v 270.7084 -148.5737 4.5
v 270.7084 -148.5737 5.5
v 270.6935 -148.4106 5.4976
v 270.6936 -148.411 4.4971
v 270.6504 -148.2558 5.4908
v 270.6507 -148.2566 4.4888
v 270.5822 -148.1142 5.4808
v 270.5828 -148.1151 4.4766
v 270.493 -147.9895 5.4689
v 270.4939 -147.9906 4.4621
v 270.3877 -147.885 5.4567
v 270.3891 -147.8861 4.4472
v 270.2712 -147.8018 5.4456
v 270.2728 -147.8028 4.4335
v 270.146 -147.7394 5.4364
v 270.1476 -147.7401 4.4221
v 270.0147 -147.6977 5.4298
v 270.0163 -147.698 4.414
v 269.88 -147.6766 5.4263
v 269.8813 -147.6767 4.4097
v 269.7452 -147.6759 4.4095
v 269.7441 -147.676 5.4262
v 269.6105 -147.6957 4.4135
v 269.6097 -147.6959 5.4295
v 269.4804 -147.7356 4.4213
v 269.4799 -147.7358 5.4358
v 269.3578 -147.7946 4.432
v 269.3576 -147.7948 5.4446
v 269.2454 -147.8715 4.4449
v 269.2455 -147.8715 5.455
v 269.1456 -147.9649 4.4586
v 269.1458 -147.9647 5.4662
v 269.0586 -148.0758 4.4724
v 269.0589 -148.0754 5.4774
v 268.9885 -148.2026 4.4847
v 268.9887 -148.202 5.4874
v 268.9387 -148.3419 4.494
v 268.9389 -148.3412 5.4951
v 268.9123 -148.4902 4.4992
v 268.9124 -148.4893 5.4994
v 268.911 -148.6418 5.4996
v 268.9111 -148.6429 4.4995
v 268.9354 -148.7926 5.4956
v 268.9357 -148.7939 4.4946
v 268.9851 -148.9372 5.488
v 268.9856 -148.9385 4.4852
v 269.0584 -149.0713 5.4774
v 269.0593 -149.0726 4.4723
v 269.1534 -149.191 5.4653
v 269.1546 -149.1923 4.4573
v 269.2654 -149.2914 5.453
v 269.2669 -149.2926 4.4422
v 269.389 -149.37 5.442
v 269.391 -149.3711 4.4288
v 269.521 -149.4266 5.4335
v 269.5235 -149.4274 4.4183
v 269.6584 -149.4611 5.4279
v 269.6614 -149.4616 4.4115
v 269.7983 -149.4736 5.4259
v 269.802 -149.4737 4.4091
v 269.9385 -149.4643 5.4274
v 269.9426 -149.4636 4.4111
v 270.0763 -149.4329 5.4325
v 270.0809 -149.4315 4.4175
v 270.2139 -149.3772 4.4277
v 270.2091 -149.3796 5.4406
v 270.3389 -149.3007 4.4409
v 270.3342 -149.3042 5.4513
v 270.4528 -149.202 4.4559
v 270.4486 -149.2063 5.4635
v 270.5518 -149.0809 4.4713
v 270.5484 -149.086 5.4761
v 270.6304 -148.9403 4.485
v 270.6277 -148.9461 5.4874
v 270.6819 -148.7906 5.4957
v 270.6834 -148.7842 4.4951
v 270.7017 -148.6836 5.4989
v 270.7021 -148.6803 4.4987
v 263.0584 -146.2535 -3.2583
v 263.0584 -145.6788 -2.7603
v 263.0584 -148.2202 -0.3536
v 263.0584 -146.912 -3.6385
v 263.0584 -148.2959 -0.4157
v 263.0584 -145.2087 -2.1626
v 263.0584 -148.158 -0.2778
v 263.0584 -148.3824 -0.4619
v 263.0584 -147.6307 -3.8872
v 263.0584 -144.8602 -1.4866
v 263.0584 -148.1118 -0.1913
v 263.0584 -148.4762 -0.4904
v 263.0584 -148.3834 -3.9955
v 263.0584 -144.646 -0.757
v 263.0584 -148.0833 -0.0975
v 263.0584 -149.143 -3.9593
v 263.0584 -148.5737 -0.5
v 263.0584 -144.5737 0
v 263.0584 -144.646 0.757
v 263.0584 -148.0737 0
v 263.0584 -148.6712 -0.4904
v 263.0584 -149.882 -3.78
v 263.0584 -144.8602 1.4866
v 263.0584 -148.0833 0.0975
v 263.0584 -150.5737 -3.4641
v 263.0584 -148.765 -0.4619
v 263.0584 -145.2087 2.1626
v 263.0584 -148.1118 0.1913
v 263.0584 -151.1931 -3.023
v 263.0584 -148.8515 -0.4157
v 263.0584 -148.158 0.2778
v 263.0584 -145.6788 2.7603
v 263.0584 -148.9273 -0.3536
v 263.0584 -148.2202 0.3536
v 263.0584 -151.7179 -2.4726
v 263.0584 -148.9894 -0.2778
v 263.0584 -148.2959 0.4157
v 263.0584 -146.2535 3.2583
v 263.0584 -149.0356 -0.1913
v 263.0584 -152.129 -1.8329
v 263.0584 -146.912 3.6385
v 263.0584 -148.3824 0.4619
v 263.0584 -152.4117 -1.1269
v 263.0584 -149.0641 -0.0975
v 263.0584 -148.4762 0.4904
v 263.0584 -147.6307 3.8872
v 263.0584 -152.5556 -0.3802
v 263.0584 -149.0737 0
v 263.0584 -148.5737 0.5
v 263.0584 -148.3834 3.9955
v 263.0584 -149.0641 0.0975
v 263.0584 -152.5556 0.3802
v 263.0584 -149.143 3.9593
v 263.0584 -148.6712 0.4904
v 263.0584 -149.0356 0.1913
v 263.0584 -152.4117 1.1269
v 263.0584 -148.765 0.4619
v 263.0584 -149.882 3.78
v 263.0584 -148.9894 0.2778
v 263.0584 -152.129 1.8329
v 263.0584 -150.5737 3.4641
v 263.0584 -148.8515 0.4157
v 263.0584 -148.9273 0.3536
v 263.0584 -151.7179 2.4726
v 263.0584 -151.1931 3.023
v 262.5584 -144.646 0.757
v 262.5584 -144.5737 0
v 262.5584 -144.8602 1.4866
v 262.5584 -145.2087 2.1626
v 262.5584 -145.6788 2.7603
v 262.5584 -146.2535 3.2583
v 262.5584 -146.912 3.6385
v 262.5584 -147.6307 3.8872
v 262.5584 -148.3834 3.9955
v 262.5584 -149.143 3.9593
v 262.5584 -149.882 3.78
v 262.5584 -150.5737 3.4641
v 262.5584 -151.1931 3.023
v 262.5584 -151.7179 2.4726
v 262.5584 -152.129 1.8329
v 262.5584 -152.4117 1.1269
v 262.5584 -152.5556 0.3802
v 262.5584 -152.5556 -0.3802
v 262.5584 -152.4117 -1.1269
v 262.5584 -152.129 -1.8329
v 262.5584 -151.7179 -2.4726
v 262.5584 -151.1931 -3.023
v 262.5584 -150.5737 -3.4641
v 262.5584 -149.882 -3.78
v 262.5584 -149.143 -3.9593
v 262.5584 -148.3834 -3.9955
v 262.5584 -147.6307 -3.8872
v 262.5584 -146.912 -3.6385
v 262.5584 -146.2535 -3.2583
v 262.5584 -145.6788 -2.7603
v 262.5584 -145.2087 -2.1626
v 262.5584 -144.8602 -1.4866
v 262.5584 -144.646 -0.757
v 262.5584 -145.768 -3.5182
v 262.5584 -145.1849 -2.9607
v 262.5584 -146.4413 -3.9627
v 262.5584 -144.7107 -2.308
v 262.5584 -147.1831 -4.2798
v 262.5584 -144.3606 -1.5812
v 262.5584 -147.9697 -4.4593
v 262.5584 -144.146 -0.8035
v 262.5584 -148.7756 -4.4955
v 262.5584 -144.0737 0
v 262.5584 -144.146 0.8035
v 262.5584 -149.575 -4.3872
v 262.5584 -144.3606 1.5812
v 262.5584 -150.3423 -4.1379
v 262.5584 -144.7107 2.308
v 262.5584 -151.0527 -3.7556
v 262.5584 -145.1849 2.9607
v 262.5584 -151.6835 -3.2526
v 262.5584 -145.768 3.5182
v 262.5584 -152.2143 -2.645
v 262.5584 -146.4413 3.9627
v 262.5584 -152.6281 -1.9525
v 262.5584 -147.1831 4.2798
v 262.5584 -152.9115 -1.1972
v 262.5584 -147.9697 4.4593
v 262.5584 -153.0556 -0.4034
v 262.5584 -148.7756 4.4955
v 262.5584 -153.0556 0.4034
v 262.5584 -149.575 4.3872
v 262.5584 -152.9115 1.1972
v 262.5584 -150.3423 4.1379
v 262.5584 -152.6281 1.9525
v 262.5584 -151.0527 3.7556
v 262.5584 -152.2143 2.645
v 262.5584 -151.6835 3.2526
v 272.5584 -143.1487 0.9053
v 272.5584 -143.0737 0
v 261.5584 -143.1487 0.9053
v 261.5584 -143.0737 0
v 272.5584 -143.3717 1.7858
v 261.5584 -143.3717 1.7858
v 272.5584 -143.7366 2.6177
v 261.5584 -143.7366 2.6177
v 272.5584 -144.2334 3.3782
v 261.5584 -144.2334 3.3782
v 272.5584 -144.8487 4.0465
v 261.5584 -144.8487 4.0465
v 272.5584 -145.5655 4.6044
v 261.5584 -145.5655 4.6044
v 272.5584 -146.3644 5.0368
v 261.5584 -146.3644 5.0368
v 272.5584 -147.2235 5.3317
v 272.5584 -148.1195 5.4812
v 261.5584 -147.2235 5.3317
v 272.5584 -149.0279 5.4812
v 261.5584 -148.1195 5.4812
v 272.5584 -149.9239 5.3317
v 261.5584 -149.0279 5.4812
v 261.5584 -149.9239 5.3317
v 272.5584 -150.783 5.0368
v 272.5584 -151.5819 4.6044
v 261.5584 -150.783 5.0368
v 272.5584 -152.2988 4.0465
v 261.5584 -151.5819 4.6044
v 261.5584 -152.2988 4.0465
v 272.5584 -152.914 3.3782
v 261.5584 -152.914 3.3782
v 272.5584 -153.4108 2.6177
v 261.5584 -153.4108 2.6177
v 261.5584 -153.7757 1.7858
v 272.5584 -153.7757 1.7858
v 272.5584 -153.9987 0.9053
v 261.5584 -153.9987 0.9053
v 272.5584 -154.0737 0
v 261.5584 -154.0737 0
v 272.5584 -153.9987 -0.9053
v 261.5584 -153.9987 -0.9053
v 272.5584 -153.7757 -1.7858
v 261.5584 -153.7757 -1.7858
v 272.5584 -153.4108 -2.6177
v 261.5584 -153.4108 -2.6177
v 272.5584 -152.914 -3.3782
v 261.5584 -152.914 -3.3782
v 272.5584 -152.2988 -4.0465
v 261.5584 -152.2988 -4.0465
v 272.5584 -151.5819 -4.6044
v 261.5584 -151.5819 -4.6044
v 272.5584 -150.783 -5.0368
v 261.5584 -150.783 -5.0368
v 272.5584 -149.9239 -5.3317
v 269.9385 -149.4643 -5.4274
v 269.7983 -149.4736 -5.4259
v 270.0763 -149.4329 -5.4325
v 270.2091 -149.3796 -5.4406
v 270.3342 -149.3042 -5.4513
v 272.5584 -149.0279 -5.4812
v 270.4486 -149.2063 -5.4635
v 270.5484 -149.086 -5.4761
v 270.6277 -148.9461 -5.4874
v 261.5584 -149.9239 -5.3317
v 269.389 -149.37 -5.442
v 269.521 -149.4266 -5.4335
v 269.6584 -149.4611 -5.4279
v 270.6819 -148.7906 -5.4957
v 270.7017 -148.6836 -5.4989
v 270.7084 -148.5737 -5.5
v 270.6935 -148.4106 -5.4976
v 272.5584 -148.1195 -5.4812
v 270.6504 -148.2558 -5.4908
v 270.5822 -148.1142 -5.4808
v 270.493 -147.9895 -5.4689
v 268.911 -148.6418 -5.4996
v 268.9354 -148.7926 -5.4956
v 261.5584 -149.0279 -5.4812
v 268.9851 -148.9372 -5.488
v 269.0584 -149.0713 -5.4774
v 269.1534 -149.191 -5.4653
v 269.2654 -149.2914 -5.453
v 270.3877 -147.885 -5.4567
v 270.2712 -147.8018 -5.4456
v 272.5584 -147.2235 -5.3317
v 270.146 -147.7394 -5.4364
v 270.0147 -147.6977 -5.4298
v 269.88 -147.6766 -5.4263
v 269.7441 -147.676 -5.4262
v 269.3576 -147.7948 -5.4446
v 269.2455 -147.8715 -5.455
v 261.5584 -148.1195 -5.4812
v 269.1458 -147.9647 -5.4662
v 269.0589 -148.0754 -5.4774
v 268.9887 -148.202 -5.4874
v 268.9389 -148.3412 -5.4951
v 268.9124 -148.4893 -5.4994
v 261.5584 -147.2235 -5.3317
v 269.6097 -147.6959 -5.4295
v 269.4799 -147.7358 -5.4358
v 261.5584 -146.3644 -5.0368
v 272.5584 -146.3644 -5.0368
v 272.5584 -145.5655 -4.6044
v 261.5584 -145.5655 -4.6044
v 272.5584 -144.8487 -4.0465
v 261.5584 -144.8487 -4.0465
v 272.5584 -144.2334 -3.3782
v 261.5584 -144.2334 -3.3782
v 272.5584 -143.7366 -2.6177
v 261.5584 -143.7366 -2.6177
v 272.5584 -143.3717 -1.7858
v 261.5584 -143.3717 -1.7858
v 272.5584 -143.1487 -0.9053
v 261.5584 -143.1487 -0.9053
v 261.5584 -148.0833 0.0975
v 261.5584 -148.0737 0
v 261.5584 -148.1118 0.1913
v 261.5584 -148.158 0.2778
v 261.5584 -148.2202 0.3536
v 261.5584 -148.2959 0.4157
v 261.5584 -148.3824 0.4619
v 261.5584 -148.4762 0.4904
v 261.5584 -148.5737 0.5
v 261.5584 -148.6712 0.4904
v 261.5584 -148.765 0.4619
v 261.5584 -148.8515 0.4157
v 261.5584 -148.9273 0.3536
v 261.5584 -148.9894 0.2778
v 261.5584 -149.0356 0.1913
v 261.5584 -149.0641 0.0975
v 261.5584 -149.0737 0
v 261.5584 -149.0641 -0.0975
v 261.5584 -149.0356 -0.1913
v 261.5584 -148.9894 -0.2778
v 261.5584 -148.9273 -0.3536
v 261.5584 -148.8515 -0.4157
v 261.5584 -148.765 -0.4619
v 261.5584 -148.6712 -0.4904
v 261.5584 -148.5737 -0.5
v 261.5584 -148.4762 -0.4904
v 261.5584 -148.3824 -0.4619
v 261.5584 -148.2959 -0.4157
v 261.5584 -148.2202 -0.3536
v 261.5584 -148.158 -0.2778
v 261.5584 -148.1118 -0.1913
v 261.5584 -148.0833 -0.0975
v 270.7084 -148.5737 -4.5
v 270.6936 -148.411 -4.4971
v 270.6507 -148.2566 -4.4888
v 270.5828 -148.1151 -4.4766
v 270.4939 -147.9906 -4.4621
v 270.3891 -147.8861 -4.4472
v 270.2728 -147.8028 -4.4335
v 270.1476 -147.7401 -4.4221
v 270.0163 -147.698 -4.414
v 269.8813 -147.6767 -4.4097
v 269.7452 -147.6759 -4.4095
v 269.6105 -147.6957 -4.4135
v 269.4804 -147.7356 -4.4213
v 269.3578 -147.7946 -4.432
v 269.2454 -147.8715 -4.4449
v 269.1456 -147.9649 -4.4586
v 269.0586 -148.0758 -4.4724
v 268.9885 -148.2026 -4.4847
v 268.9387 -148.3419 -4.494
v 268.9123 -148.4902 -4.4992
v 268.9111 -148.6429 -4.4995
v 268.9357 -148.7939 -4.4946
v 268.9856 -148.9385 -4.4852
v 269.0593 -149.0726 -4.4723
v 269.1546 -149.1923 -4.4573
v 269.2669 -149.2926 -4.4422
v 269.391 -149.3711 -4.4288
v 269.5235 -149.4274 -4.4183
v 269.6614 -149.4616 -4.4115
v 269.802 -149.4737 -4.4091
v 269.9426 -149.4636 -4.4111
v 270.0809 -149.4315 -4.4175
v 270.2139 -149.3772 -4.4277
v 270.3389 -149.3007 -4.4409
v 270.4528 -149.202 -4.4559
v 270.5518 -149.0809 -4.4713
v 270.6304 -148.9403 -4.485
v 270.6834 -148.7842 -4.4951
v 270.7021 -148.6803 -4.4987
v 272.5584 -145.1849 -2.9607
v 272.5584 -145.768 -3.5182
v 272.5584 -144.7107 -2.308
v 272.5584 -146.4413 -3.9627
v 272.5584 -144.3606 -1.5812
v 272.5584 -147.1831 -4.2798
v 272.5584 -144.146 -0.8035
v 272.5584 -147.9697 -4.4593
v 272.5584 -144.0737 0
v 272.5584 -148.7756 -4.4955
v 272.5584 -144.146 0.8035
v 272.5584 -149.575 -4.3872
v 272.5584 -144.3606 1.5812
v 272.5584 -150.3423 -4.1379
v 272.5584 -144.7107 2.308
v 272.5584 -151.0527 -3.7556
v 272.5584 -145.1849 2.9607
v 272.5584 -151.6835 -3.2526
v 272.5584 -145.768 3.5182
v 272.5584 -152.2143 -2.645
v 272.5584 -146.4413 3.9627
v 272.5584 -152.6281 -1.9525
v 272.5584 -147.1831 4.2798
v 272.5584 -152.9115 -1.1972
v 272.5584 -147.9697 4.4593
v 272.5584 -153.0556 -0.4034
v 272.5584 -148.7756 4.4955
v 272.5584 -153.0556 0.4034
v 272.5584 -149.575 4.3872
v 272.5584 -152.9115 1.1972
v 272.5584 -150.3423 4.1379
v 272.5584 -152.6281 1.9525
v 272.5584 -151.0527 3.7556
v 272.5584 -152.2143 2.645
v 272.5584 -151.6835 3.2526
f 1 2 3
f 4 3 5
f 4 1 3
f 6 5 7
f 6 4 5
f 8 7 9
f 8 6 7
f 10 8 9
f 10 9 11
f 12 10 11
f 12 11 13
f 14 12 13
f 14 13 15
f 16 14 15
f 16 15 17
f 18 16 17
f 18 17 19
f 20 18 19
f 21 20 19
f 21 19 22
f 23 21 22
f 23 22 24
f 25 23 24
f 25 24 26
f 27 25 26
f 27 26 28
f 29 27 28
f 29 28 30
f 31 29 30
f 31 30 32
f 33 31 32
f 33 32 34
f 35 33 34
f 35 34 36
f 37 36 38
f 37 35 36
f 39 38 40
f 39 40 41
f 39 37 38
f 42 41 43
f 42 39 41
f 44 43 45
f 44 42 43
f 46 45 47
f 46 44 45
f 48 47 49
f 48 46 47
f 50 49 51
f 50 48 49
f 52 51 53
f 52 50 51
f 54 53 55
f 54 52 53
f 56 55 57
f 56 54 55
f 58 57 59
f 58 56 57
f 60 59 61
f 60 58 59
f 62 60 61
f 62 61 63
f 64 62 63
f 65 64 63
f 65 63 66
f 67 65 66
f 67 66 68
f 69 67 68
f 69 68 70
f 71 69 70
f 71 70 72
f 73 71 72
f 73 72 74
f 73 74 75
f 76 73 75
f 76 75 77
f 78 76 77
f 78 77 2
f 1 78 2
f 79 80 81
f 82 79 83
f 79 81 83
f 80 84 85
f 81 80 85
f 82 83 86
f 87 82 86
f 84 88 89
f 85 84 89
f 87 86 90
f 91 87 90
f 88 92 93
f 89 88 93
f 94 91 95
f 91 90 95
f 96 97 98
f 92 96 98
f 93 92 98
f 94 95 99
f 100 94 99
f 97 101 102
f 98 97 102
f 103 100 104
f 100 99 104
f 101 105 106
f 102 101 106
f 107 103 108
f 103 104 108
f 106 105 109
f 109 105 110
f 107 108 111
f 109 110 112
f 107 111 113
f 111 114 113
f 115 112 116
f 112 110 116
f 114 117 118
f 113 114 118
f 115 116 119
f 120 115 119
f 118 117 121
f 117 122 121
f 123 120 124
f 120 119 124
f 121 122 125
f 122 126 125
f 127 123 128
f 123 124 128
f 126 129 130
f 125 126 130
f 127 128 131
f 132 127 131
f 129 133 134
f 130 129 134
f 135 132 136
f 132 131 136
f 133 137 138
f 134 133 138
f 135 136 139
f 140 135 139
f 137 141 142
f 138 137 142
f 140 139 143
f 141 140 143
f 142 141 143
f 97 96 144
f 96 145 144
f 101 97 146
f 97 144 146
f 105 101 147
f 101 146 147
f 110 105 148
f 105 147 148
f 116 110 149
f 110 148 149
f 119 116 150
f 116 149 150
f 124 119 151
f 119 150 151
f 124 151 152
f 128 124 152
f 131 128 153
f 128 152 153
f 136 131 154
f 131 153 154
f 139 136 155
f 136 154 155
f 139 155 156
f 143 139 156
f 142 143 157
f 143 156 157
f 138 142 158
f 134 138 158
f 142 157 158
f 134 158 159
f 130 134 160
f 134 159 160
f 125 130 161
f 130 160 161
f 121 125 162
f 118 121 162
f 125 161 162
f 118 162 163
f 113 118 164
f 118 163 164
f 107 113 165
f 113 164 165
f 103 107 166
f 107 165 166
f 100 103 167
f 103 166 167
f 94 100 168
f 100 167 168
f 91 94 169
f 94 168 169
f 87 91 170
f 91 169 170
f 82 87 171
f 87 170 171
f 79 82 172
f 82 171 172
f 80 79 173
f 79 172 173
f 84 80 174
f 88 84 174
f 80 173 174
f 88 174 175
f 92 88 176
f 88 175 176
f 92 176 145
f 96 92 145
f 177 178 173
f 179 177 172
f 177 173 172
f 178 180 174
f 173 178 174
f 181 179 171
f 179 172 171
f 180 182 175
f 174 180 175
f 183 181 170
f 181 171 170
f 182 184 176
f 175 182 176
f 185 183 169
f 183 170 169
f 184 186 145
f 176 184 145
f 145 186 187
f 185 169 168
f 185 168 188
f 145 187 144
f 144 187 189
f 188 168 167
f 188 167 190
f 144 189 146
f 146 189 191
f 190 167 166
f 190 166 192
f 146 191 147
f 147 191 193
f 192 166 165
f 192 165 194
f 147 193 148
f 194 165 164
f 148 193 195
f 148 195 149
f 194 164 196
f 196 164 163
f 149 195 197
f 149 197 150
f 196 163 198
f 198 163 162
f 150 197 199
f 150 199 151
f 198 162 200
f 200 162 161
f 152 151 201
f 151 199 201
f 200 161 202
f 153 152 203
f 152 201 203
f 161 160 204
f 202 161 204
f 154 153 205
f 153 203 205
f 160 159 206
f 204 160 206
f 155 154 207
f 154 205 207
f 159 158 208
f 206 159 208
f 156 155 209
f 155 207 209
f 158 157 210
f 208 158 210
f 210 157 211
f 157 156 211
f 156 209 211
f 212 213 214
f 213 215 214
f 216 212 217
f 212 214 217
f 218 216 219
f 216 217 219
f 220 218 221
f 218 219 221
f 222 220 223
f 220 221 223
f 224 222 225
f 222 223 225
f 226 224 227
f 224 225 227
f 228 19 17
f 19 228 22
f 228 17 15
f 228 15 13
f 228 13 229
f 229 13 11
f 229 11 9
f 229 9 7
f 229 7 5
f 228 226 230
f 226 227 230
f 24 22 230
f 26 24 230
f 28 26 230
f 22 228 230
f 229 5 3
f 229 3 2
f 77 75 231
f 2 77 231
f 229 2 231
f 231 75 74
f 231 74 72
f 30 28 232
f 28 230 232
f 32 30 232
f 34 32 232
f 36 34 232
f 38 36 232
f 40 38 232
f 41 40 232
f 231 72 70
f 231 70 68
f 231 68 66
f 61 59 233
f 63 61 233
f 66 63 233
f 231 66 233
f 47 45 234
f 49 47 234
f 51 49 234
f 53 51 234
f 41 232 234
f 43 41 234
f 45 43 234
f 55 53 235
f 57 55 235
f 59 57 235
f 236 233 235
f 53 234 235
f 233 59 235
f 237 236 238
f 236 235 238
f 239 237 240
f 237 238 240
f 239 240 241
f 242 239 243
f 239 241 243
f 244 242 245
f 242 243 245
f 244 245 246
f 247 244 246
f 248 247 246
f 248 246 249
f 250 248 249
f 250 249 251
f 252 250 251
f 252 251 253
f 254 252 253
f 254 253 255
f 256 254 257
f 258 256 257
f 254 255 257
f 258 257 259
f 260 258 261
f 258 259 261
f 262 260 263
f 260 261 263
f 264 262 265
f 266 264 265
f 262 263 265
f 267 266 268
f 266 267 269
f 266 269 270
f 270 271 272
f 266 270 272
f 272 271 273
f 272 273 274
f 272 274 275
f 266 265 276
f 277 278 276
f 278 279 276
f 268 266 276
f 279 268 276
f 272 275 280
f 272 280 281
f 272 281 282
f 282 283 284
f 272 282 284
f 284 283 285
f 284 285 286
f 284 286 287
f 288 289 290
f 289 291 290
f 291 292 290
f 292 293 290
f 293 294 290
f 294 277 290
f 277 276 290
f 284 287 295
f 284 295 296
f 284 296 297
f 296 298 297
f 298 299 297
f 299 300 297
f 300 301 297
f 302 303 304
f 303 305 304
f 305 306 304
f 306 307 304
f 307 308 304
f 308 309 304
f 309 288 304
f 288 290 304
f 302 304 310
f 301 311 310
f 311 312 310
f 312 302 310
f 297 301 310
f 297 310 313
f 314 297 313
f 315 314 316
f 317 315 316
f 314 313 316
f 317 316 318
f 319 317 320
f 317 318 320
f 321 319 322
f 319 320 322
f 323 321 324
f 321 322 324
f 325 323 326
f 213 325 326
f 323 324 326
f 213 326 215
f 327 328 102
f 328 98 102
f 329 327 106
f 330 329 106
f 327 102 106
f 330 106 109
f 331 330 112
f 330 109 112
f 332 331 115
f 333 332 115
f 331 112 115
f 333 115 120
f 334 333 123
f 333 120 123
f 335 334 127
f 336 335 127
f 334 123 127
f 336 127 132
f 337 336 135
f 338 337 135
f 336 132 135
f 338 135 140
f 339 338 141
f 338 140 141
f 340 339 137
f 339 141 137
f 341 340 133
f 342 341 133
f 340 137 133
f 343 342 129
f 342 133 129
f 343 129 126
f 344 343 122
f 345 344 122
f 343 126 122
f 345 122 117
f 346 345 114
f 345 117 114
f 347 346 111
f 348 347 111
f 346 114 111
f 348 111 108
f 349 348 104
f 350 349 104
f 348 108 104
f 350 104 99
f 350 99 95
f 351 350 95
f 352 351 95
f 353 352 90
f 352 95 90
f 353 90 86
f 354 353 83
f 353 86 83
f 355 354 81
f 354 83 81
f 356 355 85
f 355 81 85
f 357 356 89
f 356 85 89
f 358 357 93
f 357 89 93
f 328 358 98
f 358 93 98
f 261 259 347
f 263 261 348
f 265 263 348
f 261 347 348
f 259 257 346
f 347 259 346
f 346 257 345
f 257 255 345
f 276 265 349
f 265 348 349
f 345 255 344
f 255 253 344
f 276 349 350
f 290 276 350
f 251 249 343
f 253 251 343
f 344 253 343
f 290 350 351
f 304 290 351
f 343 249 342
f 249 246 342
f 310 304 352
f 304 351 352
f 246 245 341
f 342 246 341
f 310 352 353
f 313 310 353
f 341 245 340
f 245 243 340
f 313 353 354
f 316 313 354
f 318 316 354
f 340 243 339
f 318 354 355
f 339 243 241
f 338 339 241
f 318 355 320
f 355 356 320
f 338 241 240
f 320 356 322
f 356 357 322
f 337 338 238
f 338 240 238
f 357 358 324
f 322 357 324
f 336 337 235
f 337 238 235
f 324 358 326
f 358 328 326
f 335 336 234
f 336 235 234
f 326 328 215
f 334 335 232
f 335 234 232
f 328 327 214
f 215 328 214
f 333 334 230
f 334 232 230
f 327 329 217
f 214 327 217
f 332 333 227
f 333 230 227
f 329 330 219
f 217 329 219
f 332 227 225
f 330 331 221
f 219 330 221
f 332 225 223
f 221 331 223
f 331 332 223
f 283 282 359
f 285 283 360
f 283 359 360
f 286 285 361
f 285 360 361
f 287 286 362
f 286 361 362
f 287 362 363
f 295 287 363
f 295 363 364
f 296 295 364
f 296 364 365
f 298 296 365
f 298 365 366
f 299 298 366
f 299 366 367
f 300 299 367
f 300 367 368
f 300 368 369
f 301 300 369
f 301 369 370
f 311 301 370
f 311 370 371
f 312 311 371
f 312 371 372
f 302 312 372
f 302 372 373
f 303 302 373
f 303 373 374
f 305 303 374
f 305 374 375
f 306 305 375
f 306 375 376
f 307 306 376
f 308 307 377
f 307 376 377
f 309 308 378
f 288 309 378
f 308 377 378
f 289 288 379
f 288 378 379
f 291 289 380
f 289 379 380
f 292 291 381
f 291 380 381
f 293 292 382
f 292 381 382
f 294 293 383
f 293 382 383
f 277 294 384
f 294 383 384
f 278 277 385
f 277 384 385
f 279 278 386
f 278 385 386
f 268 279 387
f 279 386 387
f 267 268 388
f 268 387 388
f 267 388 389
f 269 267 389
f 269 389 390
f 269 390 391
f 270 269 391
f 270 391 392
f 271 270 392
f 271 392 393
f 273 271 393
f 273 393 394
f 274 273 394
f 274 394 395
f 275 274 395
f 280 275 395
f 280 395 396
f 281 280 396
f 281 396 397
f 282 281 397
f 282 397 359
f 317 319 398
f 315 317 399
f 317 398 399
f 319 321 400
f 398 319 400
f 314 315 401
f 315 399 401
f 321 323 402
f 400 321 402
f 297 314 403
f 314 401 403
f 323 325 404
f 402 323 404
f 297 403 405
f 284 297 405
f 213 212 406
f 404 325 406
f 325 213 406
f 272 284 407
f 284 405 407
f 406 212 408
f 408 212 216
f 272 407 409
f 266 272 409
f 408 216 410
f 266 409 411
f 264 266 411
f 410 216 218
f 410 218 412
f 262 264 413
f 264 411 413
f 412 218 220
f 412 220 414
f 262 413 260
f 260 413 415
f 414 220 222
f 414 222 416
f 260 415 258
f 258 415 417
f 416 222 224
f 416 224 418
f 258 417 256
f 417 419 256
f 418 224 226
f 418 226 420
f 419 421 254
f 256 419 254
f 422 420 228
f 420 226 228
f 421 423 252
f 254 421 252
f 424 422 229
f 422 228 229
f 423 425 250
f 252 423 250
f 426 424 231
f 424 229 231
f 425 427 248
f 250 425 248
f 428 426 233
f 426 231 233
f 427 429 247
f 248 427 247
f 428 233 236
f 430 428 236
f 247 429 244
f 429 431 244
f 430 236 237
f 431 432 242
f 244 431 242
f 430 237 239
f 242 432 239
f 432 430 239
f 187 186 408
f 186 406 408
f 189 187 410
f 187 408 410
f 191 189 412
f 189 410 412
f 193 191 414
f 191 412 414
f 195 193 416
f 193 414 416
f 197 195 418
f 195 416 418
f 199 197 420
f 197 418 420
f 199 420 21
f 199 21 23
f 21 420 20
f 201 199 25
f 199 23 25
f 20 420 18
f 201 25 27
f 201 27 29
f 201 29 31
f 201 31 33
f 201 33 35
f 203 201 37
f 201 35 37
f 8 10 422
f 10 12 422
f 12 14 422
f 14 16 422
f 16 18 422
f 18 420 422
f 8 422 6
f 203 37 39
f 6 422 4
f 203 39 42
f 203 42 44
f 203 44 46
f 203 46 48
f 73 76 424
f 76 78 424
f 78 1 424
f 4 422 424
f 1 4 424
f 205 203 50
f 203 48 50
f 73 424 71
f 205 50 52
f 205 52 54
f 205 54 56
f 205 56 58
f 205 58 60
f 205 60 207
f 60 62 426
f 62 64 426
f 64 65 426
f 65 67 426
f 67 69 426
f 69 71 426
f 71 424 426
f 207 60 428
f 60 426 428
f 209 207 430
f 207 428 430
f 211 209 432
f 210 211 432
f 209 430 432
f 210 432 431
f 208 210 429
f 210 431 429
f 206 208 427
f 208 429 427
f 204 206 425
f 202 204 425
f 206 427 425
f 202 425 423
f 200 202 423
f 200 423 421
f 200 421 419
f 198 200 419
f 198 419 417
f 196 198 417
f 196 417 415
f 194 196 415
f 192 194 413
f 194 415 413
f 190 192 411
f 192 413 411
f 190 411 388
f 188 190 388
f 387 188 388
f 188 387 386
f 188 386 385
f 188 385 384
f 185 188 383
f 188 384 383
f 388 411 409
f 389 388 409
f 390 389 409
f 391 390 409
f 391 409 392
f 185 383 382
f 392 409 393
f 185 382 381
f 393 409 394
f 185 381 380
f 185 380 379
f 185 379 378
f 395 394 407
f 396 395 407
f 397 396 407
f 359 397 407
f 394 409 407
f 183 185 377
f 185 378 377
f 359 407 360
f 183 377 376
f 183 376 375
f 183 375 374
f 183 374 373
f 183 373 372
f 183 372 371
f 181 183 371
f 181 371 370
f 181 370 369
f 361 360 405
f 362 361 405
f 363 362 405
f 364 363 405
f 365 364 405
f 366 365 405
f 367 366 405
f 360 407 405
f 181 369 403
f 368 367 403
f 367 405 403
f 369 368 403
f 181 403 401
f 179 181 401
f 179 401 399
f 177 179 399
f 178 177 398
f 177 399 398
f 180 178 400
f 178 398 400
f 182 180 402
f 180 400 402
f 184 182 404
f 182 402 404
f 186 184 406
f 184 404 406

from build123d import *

# Parameters (mm, degrees)
SKETCH5_R               = 0.9
CUT_EXTRUDE2_DEPTH      = 6.5
CUT_EXTRUDE2_DEPTH_BACK = 6.5


with BuildPart() as part:
    # Sketch3 → Revolve19 (revolve)
    with BuildSketch(Plane.XY):
        Polygon((262.558388758, -144.573704322), (262.558388758, -144.073704322), (272.558388758, -144.073704322), (272.558388758, -143.073704322), (261.558388758, -143.073704322), (261.558388758, -144.323704322), (261.558388758, -148.073704322), (263.058388758, -148.073704322), (263.058388758, -144.573704322), align=None)
    revolve(axis=Axis((263.058388758, -148.573704322, 0), (1, 0, 0)))

    # Sketch5 → Cut-Extrude2 (cut, two sides)
    with BuildSketch(Plane.XY) as cut_extrude2_sk:
        with Locations((269.808388758, -148.573704322)):
            Circle(SKETCH5_R)
    extrude(amount=CUT_EXTRUDE2_DEPTH, mode=Mode.SUBTRACT)
    extrude(cut_extrude2_sk.sketch, amount=-CUT_EXTRUDE2_DEPTH_BACK, mode=Mode.SUBTRACT)


solid = part.part
